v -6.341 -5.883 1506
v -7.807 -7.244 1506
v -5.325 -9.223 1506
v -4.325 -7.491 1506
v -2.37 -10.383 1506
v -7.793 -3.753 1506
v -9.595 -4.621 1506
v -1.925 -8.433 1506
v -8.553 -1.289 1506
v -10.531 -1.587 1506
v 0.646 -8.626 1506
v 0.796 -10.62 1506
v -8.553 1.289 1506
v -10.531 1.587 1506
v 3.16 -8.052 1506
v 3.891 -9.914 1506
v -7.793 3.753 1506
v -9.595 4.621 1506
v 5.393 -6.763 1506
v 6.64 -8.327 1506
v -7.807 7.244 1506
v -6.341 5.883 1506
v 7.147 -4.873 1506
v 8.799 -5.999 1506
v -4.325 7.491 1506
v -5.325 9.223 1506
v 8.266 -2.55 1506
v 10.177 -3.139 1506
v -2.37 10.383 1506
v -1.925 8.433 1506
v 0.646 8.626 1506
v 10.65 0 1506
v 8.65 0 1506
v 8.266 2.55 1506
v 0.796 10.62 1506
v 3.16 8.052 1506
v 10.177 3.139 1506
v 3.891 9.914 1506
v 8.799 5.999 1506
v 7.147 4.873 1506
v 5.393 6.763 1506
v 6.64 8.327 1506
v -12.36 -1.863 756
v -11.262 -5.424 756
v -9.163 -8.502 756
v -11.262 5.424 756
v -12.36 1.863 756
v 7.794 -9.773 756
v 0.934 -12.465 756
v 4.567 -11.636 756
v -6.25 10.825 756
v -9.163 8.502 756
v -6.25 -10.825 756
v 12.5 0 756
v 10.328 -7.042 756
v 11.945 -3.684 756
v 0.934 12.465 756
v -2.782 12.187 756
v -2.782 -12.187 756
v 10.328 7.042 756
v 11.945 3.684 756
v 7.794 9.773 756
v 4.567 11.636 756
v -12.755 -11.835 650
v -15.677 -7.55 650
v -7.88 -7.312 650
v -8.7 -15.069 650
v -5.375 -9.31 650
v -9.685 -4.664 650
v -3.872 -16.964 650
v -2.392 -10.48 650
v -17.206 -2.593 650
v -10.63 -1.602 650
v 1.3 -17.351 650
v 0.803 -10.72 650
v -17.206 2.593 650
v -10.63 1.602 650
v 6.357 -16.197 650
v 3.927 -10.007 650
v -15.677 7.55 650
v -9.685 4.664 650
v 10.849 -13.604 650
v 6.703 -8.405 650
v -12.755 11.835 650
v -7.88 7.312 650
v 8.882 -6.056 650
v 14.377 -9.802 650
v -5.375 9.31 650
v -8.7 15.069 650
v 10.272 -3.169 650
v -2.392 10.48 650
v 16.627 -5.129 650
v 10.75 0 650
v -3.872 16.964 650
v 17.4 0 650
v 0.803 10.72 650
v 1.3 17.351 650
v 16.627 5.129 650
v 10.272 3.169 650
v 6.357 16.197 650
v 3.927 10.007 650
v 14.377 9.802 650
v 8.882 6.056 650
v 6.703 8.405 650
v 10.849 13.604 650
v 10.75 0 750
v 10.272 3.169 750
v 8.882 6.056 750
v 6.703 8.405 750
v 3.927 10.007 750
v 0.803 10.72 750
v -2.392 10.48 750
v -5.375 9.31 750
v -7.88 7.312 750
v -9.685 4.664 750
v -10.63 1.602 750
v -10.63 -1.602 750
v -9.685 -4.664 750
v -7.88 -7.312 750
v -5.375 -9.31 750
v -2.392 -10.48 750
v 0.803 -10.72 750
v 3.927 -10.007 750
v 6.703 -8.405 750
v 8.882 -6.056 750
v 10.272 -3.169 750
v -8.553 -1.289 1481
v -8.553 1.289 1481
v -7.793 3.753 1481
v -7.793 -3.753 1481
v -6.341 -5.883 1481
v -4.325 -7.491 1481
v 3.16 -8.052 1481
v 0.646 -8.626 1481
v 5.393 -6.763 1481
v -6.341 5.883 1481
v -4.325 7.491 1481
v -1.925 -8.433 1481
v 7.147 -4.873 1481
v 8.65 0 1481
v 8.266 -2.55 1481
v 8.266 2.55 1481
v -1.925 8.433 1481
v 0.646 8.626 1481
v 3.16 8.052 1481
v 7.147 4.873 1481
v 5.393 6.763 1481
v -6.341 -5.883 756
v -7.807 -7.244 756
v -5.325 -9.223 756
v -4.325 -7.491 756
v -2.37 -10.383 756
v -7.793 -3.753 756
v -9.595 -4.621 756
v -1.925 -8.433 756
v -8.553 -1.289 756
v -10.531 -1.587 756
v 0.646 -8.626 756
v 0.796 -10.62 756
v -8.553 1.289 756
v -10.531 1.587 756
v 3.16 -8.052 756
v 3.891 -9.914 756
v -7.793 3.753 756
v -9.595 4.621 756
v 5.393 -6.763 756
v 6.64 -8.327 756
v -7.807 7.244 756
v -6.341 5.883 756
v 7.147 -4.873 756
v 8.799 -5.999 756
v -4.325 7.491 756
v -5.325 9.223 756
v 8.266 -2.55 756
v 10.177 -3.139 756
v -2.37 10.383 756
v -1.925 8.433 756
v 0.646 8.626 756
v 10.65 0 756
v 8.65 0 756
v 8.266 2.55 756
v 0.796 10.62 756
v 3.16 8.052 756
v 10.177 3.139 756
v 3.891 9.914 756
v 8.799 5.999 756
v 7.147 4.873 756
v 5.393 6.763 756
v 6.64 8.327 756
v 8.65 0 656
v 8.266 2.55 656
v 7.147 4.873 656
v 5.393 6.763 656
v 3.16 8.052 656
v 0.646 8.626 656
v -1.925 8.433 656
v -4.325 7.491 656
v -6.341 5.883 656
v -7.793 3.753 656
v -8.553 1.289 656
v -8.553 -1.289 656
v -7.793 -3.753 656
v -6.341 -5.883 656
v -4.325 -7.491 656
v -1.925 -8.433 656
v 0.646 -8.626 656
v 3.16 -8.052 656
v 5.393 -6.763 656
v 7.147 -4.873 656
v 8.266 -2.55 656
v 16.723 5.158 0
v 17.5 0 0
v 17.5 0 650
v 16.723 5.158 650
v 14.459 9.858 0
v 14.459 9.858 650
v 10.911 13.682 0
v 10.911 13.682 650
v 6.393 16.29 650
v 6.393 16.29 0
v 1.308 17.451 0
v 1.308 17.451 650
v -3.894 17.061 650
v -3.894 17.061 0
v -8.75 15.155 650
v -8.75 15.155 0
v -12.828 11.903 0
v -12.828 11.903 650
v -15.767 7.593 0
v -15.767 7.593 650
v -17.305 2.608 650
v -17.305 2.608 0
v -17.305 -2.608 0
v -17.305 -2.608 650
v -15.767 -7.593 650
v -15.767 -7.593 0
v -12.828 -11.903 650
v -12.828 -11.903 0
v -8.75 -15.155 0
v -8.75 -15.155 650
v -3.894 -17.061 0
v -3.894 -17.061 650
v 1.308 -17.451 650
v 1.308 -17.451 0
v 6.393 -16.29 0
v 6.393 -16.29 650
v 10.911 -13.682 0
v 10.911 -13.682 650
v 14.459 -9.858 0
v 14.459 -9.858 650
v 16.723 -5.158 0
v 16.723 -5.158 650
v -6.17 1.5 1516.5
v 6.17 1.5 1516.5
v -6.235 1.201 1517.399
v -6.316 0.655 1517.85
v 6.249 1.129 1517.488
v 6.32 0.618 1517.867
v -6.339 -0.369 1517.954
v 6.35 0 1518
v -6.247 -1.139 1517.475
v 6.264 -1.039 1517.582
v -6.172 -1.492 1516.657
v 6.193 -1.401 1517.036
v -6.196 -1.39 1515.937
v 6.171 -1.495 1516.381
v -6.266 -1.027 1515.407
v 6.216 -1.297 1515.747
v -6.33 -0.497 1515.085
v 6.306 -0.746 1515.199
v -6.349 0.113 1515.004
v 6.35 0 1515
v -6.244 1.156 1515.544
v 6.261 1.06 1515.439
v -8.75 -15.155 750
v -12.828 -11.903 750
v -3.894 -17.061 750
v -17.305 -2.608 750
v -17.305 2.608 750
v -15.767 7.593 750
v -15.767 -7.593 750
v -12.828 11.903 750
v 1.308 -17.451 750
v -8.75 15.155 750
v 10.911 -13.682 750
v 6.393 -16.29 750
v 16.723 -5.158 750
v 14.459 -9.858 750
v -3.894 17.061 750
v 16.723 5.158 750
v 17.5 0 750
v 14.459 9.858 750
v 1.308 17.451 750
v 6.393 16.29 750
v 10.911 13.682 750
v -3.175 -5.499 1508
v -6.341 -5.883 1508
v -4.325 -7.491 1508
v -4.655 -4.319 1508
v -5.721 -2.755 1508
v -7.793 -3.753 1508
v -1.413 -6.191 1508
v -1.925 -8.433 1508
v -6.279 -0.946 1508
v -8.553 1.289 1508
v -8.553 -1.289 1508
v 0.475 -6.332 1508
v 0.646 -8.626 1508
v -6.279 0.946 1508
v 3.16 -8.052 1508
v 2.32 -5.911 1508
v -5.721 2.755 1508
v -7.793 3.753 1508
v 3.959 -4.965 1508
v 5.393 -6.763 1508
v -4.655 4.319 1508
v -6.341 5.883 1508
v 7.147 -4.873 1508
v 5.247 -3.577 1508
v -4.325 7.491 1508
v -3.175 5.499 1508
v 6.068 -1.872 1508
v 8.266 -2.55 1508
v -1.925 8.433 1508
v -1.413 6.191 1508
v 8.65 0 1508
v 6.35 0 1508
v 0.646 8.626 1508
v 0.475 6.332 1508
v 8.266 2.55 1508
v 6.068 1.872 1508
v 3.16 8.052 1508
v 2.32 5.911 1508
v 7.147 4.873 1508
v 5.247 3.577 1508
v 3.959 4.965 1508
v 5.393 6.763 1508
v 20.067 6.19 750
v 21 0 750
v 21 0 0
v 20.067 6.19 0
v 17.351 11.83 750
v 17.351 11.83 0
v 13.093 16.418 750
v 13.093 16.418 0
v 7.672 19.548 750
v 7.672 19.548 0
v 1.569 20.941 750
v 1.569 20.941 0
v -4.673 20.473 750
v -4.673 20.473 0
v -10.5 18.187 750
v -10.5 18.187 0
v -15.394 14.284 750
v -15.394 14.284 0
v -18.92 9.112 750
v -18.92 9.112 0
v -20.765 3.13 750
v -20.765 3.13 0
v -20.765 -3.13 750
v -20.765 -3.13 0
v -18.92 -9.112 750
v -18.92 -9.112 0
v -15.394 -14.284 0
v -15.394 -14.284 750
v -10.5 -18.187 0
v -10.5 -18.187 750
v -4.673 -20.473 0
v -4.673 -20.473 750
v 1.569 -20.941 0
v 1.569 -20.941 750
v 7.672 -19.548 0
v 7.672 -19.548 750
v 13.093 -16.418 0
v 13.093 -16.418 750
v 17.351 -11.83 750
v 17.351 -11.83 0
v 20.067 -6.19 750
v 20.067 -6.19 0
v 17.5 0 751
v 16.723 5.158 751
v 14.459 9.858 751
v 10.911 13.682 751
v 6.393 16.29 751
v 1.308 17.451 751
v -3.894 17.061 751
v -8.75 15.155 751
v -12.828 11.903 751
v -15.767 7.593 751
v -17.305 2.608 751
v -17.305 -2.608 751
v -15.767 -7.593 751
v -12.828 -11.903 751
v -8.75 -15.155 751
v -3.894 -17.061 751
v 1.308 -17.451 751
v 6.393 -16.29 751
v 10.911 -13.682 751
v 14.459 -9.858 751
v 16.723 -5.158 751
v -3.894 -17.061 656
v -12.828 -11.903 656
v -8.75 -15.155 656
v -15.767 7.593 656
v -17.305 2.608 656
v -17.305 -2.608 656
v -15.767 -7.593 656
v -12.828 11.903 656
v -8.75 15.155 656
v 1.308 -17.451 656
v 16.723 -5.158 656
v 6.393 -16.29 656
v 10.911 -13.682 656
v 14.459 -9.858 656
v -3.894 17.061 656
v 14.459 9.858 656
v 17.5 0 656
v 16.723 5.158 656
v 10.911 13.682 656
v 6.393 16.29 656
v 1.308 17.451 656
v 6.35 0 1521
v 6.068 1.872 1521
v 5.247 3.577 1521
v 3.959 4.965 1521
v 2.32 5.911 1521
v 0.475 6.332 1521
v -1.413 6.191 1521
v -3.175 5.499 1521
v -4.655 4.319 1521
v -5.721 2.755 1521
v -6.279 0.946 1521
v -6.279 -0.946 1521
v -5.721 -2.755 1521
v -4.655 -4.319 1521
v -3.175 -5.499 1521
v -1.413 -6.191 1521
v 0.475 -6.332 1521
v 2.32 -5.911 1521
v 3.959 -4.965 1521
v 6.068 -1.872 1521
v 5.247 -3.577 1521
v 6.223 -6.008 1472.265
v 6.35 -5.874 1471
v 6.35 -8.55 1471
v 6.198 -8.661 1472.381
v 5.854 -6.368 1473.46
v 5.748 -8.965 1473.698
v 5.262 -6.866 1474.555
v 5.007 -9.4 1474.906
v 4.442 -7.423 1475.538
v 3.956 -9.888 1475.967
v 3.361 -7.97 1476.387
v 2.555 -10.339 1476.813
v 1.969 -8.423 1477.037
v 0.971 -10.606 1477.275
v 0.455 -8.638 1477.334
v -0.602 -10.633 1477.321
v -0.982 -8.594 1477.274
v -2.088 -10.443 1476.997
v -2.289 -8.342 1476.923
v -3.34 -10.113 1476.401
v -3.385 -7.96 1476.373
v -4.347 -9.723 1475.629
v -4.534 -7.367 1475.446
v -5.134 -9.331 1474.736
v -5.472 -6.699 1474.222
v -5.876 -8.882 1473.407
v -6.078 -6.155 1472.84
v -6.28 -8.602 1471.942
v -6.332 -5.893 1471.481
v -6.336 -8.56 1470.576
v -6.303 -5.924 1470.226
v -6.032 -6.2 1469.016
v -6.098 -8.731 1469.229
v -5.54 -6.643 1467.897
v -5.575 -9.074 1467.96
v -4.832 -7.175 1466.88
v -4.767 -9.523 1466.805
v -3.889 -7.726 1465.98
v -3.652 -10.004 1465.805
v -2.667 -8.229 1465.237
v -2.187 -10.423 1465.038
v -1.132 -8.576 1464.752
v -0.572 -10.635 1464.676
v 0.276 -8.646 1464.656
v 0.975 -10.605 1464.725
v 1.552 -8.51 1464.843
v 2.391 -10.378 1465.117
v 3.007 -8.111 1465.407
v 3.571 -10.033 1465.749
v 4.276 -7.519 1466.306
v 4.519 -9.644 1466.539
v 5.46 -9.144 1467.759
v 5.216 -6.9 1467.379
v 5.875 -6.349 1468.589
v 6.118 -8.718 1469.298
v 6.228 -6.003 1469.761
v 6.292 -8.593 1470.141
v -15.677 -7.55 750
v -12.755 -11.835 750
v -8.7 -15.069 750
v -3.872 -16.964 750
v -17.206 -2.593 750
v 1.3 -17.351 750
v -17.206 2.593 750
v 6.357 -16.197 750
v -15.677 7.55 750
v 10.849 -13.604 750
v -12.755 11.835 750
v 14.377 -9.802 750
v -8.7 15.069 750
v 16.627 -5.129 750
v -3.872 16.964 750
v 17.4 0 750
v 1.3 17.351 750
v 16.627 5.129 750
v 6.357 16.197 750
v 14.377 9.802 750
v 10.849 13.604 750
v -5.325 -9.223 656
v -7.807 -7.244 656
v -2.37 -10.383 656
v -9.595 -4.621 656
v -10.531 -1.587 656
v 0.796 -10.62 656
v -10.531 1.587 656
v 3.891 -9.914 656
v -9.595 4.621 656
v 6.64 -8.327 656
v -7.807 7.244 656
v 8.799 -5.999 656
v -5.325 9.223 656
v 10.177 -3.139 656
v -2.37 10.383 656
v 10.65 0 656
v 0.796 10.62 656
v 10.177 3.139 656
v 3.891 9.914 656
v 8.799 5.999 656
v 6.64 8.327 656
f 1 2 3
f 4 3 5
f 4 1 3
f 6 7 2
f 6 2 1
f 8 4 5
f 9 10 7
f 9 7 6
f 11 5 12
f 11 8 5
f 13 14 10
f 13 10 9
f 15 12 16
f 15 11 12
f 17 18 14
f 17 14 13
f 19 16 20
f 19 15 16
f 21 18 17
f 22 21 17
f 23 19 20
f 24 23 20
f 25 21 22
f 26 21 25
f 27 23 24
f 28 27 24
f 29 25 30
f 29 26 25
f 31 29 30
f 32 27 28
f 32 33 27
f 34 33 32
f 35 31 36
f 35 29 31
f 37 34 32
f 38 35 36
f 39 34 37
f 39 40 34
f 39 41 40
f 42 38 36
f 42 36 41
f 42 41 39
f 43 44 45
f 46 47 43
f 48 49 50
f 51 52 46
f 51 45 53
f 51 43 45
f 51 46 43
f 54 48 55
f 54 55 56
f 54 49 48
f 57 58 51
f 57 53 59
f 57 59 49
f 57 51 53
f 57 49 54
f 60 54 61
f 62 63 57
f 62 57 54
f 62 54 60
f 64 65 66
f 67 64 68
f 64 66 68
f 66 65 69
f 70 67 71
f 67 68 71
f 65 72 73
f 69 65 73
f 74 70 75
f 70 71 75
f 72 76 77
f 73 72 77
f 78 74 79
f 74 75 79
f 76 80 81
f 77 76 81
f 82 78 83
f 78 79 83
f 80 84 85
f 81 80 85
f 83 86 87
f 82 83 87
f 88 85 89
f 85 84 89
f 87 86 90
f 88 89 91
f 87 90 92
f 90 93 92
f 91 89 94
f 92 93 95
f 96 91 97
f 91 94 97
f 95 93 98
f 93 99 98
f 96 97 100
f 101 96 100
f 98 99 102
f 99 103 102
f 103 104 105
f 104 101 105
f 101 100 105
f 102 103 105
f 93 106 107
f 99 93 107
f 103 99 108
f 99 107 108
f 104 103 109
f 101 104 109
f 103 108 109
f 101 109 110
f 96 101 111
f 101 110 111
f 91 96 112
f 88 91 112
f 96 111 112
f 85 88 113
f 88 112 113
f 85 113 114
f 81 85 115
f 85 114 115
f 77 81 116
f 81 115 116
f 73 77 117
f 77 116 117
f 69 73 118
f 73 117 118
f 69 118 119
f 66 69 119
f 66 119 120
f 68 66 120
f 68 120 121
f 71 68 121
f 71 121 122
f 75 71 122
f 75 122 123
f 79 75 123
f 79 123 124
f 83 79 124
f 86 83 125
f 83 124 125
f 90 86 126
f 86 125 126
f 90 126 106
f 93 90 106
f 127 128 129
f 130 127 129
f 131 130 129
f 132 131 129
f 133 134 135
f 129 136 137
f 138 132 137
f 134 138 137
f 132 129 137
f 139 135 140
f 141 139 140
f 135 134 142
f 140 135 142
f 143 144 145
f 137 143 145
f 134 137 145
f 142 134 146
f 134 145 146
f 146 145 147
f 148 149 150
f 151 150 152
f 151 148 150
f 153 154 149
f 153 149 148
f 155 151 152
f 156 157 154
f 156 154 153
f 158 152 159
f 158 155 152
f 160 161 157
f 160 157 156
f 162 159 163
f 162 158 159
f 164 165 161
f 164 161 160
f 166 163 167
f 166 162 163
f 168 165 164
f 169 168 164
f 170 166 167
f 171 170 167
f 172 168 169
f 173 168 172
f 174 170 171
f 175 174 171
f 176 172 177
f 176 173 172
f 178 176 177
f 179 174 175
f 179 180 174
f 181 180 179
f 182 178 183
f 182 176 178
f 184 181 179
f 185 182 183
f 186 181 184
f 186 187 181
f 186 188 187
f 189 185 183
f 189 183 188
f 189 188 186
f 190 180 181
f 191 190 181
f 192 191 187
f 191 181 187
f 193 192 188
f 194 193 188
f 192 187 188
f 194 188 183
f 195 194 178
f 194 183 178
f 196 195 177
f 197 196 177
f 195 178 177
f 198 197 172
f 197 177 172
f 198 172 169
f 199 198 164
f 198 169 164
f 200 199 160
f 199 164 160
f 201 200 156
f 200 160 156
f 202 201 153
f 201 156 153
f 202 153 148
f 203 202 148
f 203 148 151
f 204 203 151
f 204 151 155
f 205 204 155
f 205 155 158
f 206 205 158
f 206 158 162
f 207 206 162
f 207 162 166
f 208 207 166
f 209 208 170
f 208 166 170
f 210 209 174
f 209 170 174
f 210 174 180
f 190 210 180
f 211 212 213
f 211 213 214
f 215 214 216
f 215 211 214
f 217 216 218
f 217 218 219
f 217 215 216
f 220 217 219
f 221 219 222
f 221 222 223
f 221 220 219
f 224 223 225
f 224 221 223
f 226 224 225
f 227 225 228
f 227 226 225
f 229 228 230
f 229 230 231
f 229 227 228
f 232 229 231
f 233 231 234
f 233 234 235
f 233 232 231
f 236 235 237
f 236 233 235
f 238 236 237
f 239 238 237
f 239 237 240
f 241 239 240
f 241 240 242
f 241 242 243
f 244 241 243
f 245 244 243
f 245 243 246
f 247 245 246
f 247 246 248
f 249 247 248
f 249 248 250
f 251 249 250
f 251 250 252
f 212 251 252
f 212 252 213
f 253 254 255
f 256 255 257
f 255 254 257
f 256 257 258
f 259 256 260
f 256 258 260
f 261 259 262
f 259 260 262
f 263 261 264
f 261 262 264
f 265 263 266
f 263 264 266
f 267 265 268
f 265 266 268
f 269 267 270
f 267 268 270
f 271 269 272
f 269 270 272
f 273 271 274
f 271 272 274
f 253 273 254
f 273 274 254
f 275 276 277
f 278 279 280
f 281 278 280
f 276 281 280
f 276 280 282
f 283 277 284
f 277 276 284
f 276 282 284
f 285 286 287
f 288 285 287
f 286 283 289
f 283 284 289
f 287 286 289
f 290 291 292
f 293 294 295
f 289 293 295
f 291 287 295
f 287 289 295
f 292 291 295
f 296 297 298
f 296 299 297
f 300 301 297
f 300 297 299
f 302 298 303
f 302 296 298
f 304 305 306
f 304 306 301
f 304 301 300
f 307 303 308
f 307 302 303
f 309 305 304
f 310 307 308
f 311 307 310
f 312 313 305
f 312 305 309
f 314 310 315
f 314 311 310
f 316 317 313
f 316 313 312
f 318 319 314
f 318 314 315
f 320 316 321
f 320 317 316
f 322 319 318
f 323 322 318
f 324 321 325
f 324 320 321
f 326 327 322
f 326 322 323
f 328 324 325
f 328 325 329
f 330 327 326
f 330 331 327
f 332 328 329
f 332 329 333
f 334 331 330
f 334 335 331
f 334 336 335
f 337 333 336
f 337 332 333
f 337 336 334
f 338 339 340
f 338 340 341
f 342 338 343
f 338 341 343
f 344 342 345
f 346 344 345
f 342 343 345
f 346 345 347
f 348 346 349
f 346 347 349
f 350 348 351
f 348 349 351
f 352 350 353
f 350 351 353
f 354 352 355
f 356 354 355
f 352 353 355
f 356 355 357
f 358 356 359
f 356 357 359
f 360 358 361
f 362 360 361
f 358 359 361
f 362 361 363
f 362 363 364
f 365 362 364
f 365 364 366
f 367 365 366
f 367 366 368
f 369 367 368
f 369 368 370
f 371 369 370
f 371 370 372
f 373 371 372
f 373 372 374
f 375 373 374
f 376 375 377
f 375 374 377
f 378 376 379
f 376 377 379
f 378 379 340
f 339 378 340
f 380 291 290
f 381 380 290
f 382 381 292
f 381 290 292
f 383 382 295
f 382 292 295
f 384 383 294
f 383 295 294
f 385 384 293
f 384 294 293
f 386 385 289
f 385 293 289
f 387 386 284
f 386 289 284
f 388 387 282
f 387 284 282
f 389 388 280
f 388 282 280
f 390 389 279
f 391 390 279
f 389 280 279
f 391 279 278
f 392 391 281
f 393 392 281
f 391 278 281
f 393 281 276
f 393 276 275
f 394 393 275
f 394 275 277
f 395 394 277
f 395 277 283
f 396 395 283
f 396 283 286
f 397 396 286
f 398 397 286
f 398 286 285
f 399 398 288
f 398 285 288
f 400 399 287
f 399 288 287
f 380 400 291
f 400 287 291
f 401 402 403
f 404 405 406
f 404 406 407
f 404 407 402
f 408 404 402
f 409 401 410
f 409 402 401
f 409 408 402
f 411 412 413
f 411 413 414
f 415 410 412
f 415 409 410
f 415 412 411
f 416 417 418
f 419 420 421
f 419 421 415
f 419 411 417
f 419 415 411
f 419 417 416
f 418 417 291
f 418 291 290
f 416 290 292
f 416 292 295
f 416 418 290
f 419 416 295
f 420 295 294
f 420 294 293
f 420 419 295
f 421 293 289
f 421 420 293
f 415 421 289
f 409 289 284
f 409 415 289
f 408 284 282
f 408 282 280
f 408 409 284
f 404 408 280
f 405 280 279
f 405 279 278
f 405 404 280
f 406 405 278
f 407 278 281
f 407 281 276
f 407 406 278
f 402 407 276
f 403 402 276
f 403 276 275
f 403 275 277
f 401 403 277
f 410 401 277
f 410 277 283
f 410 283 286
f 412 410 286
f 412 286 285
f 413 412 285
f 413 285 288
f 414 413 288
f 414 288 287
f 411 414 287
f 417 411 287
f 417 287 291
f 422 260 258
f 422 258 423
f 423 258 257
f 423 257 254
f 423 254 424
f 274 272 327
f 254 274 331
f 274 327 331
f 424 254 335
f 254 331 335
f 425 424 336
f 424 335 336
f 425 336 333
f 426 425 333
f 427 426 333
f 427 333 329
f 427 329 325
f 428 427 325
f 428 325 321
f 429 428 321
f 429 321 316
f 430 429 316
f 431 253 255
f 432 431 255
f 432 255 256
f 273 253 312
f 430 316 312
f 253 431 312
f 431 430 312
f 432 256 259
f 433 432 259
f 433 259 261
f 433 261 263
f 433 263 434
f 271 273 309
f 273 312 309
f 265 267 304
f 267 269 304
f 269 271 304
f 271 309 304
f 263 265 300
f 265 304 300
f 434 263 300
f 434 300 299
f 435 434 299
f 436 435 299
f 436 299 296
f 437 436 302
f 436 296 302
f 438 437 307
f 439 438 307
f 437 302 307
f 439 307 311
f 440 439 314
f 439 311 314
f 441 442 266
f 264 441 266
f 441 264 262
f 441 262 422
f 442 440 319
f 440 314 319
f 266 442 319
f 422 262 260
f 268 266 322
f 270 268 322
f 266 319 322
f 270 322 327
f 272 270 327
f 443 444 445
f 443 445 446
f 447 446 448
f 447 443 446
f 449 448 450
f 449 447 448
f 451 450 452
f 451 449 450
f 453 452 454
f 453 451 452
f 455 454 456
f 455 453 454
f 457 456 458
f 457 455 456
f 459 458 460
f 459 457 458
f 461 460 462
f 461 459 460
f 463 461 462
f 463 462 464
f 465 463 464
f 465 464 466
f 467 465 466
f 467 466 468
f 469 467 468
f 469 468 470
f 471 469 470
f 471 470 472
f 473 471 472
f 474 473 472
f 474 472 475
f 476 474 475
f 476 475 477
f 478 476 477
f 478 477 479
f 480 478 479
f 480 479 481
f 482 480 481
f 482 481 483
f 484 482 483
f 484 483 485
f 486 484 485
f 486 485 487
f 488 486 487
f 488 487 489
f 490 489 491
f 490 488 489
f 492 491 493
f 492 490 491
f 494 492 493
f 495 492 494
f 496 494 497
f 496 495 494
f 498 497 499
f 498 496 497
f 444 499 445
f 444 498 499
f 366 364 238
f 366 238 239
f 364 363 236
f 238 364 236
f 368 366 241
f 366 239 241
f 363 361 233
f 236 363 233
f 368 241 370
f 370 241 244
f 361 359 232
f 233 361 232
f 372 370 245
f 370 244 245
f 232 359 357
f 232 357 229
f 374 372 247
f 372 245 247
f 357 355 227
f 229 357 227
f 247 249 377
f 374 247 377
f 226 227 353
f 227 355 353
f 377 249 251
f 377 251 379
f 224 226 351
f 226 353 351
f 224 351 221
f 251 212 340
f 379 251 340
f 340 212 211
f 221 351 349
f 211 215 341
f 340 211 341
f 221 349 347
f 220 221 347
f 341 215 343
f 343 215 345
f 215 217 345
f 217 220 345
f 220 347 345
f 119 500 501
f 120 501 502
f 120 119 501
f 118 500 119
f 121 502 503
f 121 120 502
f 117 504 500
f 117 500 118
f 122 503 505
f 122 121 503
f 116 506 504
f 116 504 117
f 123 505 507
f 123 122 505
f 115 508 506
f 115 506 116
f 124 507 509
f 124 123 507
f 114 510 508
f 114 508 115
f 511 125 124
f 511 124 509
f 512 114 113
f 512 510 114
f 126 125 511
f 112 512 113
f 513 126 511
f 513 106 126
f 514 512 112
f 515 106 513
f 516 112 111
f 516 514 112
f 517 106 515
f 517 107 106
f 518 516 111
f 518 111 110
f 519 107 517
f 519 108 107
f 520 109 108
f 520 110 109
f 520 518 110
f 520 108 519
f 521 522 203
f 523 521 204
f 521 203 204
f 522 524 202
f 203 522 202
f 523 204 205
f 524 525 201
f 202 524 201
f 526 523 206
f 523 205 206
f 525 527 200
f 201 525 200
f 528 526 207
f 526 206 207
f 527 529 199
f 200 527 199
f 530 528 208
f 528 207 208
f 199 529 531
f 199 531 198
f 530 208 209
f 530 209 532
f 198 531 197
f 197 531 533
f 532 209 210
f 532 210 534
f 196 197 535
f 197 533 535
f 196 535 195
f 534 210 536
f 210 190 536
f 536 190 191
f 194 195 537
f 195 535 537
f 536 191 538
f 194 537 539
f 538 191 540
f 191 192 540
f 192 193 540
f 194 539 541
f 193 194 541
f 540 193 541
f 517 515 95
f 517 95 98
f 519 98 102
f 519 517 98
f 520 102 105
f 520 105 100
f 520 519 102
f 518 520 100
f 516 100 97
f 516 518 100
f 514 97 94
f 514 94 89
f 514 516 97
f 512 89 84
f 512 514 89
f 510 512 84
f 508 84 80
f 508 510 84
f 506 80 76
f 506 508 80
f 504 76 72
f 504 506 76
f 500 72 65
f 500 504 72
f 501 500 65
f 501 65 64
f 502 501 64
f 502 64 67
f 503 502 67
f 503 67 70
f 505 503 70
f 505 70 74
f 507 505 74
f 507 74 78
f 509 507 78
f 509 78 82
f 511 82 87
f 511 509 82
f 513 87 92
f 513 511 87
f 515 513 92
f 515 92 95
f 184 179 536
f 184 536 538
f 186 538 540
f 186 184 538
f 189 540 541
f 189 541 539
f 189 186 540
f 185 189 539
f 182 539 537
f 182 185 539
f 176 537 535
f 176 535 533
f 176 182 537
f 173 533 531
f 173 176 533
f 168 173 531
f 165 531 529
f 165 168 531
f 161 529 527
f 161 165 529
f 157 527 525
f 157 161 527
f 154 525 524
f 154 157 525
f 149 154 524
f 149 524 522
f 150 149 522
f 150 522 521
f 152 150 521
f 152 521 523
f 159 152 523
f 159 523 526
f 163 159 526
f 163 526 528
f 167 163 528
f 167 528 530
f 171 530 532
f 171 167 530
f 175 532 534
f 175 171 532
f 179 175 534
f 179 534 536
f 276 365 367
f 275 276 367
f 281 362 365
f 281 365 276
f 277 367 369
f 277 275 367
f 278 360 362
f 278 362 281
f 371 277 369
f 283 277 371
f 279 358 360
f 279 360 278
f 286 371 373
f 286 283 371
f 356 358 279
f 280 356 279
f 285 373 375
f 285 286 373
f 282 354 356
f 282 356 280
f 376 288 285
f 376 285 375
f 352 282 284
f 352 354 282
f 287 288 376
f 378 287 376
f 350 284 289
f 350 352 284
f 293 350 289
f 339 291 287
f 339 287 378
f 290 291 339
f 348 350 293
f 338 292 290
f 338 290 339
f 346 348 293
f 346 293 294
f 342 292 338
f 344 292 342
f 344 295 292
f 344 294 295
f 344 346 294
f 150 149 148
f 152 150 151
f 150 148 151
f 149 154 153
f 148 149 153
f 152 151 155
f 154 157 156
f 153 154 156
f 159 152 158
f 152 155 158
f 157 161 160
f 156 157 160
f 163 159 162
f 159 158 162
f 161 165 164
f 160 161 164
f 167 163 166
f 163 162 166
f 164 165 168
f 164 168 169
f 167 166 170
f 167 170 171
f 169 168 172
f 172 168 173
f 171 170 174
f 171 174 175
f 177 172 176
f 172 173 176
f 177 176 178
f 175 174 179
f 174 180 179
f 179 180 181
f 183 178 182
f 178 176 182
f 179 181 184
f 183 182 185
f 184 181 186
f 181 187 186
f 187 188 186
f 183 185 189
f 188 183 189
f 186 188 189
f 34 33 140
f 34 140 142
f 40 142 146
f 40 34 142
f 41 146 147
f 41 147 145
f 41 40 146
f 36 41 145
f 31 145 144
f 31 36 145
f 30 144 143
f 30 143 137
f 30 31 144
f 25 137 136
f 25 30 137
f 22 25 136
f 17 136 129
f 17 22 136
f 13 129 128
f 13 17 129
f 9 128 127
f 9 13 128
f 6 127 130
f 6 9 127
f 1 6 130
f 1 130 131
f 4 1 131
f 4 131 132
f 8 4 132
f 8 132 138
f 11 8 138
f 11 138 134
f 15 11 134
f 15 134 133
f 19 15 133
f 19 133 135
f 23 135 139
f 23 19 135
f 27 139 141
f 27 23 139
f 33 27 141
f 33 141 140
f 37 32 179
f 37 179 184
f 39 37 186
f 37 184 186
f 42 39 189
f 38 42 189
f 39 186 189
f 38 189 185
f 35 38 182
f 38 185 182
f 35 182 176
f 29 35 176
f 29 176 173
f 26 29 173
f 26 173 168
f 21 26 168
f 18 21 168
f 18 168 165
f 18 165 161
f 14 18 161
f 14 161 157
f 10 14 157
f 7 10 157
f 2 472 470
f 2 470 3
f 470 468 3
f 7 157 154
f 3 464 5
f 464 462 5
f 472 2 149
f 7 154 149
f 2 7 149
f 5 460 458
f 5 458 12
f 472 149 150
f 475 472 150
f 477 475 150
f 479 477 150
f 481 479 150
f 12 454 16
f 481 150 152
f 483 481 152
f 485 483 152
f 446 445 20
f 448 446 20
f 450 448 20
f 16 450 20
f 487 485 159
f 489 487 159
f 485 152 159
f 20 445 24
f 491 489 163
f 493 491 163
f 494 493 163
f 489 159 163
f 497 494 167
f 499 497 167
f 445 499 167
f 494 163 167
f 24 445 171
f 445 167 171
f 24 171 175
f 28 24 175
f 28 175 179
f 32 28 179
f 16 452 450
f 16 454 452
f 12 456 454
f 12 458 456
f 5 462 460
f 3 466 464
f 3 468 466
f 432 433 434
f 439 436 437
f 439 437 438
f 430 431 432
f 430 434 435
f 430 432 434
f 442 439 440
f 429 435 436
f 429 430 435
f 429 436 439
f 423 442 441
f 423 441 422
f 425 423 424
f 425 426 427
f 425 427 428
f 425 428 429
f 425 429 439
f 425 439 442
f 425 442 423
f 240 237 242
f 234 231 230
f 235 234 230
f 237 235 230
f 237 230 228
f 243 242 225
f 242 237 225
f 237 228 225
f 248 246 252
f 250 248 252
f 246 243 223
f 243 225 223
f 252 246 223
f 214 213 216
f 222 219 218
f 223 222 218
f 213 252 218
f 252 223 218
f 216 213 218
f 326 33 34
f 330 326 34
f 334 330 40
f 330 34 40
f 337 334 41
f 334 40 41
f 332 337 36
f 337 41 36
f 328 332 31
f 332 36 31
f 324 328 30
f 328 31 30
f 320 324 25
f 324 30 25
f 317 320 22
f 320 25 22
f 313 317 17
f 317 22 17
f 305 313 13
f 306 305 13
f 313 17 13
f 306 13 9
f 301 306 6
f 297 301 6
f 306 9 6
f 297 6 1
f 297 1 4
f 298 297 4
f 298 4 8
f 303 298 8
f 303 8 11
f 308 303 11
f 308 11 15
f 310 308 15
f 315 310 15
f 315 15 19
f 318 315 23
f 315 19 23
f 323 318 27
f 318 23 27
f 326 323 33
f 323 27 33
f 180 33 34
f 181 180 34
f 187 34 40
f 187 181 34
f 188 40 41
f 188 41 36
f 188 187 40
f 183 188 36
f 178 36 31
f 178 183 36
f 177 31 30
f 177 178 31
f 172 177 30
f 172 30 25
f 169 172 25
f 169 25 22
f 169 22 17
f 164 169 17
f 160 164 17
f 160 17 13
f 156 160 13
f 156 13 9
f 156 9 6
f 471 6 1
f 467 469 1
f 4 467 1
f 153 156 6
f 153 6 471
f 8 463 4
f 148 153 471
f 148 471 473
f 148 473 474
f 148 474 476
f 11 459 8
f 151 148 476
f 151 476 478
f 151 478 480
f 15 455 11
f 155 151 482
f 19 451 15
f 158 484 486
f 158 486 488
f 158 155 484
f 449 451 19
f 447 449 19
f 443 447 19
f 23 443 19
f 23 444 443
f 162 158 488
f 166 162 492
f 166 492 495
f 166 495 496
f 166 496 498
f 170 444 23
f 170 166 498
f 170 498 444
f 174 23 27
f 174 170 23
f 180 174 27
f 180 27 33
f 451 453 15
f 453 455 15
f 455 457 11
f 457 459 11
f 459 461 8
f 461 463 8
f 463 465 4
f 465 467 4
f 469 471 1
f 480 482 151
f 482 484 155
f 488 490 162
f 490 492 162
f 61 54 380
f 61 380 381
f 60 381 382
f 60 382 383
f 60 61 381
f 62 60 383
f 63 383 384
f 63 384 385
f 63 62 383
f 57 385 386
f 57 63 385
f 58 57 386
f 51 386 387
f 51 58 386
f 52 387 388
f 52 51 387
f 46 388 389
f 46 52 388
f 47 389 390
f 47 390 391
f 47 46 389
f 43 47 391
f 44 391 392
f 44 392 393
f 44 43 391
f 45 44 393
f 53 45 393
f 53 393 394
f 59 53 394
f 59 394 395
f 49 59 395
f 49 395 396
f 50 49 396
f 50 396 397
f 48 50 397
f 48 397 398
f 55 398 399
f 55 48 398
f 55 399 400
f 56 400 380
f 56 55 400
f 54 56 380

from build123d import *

# Parameters (mm, degrees)
F0_R      = 21
F0_R_2    = 17.5
F1_DEPTH  = 750
F2_R      = 17.5
F3_DEPTH  = 6
F4_R      = 10.65
F4_R_2    = 8.65
F5_DEPTH  = 750
F6_R      = 10.65
F6_R_2    = 8.65
F7_DEPTH  = 100
F9_R      = 17.5
F10_DEPTH = 6
F11_R     = 8.65
F12_DEPTH = 25
F13_R     = 6.35
F14_DEPTH = 15
F15_DEPTH = 15
F16_R     = 1.5
F17_DEPTH = 10
F18_R     = 8.65
F18_R_2   = 6.35
F19_DEPTH = 2
F20_R     = 6.35
F21_DEPTH = 21.001
F22_R     = 17.4
F22_R_2   = 10.75
F23_DEPTH = 100
F24_SIZE  = 5


with BuildPart() as f1:
    # F0 (on Top) → F1 (new body)
    with BuildSketch(Plane.XY):
        Circle(F0_R)
        Circle(F0_R_2, mode=Mode.SUBTRACT)
    extrude(amount=F1_DEPTH)

    # F9 (on offset) → F10 (join)
    with BuildSketch(Plane.XY.offset(650)):
        Circle(F9_R)
    extrude(amount=F10_DEPTH)


with BuildPart() as f3:
    # F2 (on face) → F3 (new body)
    with BuildSketch(Plane.XY.offset(750)):
        Circle(F2_R)
    extrude(amount=F3_DEPTH)

    # F24
    f24_edges = [f3.edges().sort_by_distance(p)[0] for p in [
        (-17.5, 0, 756),
    ]]
    chamfer(f24_edges, length=F24_SIZE)


with BuildPart() as f5:
    # F4 (on face) → F5 (new body)
    with BuildSketch(Plane.XY.offset(756)):
        Circle(F4_R)
        Circle(F4_R_2, mode=Mode.SUBTRACT)
    extrude(amount=F5_DEPTH)

    # F20 (on Front) → F21 (cut, through all)
    with BuildSketch(Plane.XZ):
        with Locations((0, 1471)):
            Circle(F20_R)
    extrude(amount=F21_DEPTH, mode=Mode.SUBTRACT)


with BuildPart() as f7:
    # F6 (on face) → F7 (new body)
    with BuildSketch(Plane.XY.offset(756)):
        Circle(F6_R)
        Circle(F6_R_2, mode=Mode.SUBTRACT)
    extrude(amount=-F7_DEPTH)


with BuildPart() as f12:
    # F11 (on face) → F12 (new body)
    with BuildSketch(Plane.XY.offset(1506)):
        Circle(F11_R)
    extrude(amount=-F12_DEPTH)

    # F13 (on face) → F14 (join)
    with BuildSketch(Plane.XY.offset(1506)):
        Circle(F13_R)
    extrude(amount=F14_DEPTH)

    # F13 (on face) → F15 (join)
    with BuildSketch(Plane.XY.offset(1506)):
        Circle(F13_R)
    extrude(amount=F15_DEPTH)

    # F16 (on Right) → F17 (cut, symmetric)
    with BuildSketch(Plane.YZ):
        with Locations((0, 1516.5)):
            Circle(F16_R)
    extrude(amount=F17_DEPTH, both=True, mode=Mode.SUBTRACT)

    # F18 (on face) → F19 (join)
    with BuildSketch(Plane.XY.offset(1506)):
        Circle(F18_R)
        Circle(F18_R_2, mode=Mode.SUBTRACT)
    extrude(amount=F19_DEPTH)


with BuildPart() as f23:
    # F22 (on face) → F23 (new body)
    with BuildSketch(Plane.XY.offset(750)):
        Circle(F22_R)
        Circle(F22_R_2, mode=Mode.SUBTRACT)
    extrude(amount=-F23_DEPTH)


solid = Compound([f1.part, f3.part, f5.part, f7.part, f12.part, f23.part])
